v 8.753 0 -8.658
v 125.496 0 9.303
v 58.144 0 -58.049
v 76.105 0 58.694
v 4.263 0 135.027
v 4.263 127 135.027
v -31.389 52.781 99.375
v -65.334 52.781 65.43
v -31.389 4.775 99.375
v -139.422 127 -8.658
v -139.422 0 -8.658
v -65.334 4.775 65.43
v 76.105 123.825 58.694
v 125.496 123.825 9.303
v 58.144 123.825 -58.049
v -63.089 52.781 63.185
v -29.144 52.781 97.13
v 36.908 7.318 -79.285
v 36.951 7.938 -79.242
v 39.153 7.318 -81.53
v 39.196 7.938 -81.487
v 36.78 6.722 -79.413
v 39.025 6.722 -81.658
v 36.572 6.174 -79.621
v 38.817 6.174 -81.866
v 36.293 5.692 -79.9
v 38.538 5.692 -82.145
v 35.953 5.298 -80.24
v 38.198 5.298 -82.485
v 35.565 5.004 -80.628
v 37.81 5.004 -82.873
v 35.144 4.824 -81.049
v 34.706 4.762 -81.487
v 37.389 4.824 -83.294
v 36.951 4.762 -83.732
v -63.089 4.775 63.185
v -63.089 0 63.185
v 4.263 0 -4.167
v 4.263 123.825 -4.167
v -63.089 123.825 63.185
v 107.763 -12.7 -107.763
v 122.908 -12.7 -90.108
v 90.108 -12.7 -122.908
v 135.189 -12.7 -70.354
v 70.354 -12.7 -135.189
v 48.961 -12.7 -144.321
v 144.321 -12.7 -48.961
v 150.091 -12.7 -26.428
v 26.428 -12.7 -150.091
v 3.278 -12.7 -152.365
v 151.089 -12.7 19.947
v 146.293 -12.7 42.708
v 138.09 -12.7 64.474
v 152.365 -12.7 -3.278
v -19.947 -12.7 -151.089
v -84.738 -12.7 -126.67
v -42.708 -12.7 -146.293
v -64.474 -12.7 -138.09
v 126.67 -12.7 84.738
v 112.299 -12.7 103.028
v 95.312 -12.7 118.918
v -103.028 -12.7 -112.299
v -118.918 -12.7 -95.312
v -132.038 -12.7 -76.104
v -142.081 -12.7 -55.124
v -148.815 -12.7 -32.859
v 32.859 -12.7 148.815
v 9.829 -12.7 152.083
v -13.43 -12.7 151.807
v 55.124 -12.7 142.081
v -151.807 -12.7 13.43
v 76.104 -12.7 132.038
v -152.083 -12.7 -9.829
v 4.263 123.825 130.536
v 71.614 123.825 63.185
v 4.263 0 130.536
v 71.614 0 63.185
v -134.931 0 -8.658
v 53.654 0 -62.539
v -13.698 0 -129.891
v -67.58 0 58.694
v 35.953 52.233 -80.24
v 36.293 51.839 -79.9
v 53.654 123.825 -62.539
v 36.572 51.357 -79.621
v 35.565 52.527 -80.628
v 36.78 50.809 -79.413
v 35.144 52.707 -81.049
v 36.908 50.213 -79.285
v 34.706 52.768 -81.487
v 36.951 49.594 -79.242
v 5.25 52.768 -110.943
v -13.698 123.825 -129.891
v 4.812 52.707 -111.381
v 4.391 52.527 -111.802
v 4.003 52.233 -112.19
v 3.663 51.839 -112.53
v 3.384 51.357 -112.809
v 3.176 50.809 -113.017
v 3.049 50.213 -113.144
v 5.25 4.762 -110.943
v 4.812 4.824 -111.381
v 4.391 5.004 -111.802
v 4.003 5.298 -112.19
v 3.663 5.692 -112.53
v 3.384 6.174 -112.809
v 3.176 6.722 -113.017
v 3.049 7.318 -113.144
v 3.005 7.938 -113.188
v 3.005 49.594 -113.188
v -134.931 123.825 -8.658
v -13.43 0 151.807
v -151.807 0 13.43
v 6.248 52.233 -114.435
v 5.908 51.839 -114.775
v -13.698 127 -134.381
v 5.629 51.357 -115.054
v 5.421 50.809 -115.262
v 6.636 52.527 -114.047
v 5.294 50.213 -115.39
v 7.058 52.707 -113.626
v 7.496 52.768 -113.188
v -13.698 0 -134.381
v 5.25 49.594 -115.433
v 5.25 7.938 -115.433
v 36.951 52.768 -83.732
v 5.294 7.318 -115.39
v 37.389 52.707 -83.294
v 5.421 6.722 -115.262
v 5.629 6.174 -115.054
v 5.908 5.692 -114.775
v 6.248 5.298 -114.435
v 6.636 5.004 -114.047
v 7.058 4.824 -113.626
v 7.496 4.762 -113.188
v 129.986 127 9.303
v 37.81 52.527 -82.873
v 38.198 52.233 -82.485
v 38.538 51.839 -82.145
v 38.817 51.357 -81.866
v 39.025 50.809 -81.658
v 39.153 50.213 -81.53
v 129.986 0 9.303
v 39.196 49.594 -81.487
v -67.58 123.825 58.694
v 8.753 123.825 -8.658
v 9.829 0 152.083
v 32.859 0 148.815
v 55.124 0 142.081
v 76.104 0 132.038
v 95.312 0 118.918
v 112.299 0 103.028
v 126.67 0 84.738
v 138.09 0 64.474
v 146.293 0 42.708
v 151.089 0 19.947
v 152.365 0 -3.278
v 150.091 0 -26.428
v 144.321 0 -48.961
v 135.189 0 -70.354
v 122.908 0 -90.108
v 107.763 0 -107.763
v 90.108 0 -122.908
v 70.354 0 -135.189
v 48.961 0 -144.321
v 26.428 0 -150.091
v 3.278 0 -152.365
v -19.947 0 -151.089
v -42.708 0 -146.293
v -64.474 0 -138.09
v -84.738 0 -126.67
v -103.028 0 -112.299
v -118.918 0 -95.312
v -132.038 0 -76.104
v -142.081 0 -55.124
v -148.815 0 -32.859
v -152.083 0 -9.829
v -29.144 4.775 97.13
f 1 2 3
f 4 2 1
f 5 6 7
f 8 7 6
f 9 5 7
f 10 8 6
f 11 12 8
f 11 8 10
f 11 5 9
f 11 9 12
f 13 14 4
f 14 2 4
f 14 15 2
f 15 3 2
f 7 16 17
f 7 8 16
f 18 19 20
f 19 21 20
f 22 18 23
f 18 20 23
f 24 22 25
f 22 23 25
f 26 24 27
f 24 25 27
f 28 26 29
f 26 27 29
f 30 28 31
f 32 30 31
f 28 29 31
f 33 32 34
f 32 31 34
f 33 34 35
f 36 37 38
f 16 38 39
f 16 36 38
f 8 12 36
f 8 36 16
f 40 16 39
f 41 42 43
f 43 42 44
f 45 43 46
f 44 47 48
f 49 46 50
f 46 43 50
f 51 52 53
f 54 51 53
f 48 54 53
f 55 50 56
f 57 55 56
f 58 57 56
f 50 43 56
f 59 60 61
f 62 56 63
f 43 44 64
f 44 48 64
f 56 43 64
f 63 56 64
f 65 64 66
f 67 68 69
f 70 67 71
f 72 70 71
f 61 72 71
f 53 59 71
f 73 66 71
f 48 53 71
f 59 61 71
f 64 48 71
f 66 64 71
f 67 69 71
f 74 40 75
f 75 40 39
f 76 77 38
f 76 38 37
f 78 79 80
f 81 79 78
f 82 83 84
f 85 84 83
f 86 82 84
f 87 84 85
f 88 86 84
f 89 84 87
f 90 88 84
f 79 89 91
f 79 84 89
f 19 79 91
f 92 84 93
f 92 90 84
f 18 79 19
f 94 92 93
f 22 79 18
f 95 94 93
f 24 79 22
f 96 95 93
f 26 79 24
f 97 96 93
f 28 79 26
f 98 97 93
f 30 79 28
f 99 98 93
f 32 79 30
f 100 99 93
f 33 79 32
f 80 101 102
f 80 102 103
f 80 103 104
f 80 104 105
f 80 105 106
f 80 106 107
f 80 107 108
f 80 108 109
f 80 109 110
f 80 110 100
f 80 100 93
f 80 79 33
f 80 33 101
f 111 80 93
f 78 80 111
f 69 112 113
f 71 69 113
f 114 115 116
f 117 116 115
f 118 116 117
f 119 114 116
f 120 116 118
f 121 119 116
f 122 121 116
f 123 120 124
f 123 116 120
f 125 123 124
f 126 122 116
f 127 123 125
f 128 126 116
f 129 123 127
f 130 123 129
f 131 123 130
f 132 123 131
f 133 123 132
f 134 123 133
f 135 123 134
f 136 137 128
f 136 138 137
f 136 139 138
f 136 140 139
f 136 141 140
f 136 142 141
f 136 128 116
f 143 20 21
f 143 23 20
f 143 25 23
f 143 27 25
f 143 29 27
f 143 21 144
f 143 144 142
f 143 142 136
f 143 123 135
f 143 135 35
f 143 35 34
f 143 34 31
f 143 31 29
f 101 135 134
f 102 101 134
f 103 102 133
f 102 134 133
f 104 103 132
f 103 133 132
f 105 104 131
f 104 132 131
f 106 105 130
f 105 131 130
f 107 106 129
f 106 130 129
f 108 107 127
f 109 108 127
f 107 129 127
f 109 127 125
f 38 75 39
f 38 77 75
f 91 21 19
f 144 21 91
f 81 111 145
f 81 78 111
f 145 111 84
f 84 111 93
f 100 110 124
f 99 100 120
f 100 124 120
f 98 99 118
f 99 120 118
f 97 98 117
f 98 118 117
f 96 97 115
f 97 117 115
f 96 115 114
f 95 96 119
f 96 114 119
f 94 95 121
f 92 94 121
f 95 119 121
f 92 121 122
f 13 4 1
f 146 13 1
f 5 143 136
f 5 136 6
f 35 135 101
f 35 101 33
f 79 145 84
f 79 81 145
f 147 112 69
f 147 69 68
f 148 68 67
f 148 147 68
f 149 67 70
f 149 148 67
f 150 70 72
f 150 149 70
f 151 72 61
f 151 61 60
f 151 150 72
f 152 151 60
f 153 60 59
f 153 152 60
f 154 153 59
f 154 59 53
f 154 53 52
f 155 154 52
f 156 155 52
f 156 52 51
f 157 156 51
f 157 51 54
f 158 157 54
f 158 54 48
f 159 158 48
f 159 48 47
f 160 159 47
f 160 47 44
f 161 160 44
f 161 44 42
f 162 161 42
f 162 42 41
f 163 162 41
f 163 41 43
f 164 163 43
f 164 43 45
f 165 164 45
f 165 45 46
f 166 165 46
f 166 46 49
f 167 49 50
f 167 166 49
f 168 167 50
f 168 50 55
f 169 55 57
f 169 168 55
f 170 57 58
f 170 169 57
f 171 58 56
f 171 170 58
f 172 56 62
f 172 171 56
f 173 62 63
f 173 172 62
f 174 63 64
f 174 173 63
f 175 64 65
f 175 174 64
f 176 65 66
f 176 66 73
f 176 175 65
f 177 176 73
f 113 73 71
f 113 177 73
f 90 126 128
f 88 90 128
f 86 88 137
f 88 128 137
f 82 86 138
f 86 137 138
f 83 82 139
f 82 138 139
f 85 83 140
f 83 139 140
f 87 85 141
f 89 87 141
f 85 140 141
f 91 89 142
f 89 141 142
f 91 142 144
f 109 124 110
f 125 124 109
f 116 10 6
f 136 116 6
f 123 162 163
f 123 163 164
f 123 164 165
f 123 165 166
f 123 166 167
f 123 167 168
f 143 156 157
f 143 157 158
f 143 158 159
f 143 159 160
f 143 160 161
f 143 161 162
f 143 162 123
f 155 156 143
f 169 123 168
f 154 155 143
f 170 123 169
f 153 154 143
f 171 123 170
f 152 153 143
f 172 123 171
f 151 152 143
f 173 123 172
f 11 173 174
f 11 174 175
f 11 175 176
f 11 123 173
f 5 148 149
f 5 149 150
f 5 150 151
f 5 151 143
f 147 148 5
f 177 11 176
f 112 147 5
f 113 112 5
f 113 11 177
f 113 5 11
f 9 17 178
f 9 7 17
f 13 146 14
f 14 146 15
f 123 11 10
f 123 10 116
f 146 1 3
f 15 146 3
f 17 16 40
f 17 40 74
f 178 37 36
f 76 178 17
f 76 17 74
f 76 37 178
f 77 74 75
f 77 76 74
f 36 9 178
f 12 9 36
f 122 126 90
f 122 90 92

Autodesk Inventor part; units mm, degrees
ref_plane "YZ Plane" through (0, 0, 0) normal (1, 0, 0) x (0, 1, 0)
ref_plane "XZ Plane" through (0, 0, 0) normal (0, 1, 0) x (-1, 0, 0)
ref_plane "XY Plane" through (0, 0, 0) normal (0, 0, 1) x (1, 0, 0)
sketch "Sketch1" plane through (0, 0, 0) normal (0, 1, 0) x (-1, 0, 0)
  arc A0 (13.4296, 151.8071) -> (151.8071, 13.4296) centre (0, 0) ccw
  line L0 (13.4296, 151.8071) -> (151.8071, 13.4296)
  dimension "d0" = 304.8
sketch "Sketch2" plane through (0, 0, 0) normal (0, 1, 0) x (-1, 0, 0)
  line L0 (-4.2626, 135.0266) -> (-129.9862, 9.3031)
  line L1 (-129.9862, 9.3031) -> (13.6979, -134.381)
  line L2 (13.6979, -134.381) -> (139.4215, -8.6575)
  line L3 (139.4215, -8.6575) -> (-4.2626, 135.0266)
  line L4 (-4.2626, 135.0266) -> (-76.1046, 63.1846)
  line L5 (-76.1046, 63.1846) -> (-4.2626, -8.6575)
  line L6 (-4.2626, -8.6575) -> (67.5795, 63.1846)
  line L7 (67.5795, 63.1846) -> (-4.2626, 135.0266)
  line L8 (-129.9862, 9.3031) -> (-76.1046, 63.1846)
  line L9 (-76.1046, 63.1846) -> (-4.2626, -8.6575)
  line L10 (-4.2626, -8.6575) -> (-58.1441, -62.539)
  line L11 (-58.1441, -62.539) -> (-129.9862, 9.3031)
  line L12 (-4.2626, 130.5365) -> (-71.6145, 63.1846)
  line L13 (-71.6145, 63.1846) -> (-4.2626, -4.1673)
  line L14 (-4.2626, -4.1673) -> (63.0893, 63.1846)
  line L15 (63.0893, 63.1846) -> (-4.2626, 130.5365)
  line L16 (-125.496, 9.3031) -> (-76.1046, 58.6945)
  line L17 (-76.1046, 58.6945) -> (-8.7527, -8.6575)
  line L18 (-8.7527, -8.6575) -> (-58.1441, -58.0489)
  line L19 (-58.1441, -58.0489) -> (-125.496, 9.3031)
  line L20 (67.5795, 58.6945) -> (-53.654, -62.539)
  line L21 (-53.654, -62.539) -> (13.6979, -129.8909)
  line L22 (13.6979, -129.8909) -> (134.9314, -8.6575)
  line L23 (134.9314, -8.6575) -> (67.5795, 58.6945)
  point P0 (0, 0)
  point P1 (4.7177, 0.3228)
  dimension "d42" = 203.2
  dimension "d43" = 177.8
  dimension "d44" = 3.175
  dimension "d45" = 6.35
  dimension "d46" = 95.25
  dimension "d47" = 171.45
  dimension "d48" = 95.25
  dimension "d49" = 69.85
  dimension "d50" = 95.25
extrude "Extrusion1" add sketch "Sketch1" against normal blind 12.7
extrude "Extrusion2" add sketch "Sketch2" along normal blind 127
sketch "Sketch3" plane through (-13.6979, 0, -134.381) normal (0.7071068, 0, -0.7071068) x (-0.7071068, 0, -0.7071068)
  line L0 (-29.972, 4.7625) -> (-71.628, 4.7625)
  line L1 (-74.803, 7.9375) -> (-74.803, 49.5935)
  line L2 (-71.628, 52.7685) -> (-29.972, 52.7685)
  line L3 (-26.797, 49.5935) -> (-26.797, 7.9375)
  line L4 (-257.1076, 0) -> (47.6924, 0) projected
  line L5 (0, 0) -> (0, 127) projected
  arc A0 (-26.797, 49.5935) -> (-29.972, 52.7685) centre (-29.972, 49.5935) ccw
  arc A1 (-29.972, 4.7625) -> (-26.797, 7.9375) centre (-29.972, 7.9375) ccw
  arc A2 (-74.803, 7.9375) -> (-71.628, 4.7625) centre (-71.628, 7.9375) ccw
  arc A3 (-71.628, 52.7685) -> (-74.803, 49.5935) centre (-71.628, 49.5935) ccw
  point P0 (-104.7076, 0)
  point P1 (-74.803, 52.7685)
  point P2 (-74.803, 4.7625)
  point P3 (-26.797, 52.7685)
  point P4 (-6.8599, 0)
  point P5 (-202.5554, 0)
  dimension "d25" = 4.7625
  dimension "d26" = 48.006
  dimension "d27" = 26.797
  dimension "d28" = 48.006
  dimension "d29" = 3.175
sketch "Sketch4" plane through (4.2626, 0, 135.0266) normal (-0.7071068, 0, 0.7071068) x (0.7071068, 0, 0.7071068)
  line L0 (-98.425, 52.7812) -> (-50.419, 52.7812)
  line L1 (-50.419, 52.7812) -> (-50.419, 4.7752)
  line L2 (-50.419, 4.7752) -> (-98.425, 4.7752)
  line L3 (-98.425, 4.7752) -> (-98.425, 52.7812)
  line L4 (-0.6446, 0) -> (-196.3401, 0) projected
  line L5 (0, 0) -> (0, 127) projected
  point P0 (-98.4924, 0)
  dimension "d30" = 48.006
  dimension "d31" = 48.006
  dimension "d32" = 4.7752
  dimension "d33" = 50.419
extrude "Extrusion3" cut sketch "Sketch4" against normal up to next
extrude "Extrusion4" cut sketch "Sketch3" against normal up to next
sketch "Sketch5" plane through (0, 127, 0) normal (0, 1, 0) x (1, 0, 0)
  line L0 (-139.4215, 8.6575) -> (-13.6979, 134.381) projected
  line L1 (4.2626, -135.0266) -> (-139.4215, 8.6575)
  line L2 (-139.4215, 8.6575) -> (-13.6979, 134.381)
  line L3 (-13.6979, 134.381) -> (129.9862, -9.3031) projected
  line L4 (-13.6979, 134.381) -> (129.9862, -9.3031)
  line L5 (129.9862, -9.3031) -> (4.2626, -135.0266)
  point P0 (0, 0)
extrude "Extrusion5" cut sketch "Sketch5" against normal blind 3.175
sketch "Sketch6" plane through (0, 123.825, 0) normal (0, 1, 0) x (1, 0, 0)
  line L0 (4.2626, -135.0266) -> (-139.4215, 8.6575) projected
  line L1 (4.2626, -135.0266) -> (-139.4215, 8.6575)
  line L2 (-139.4215, 8.6575) -> (-13.6979, 134.381)
  line L3 (-13.6979, 134.381) -> (129.9862, -9.3031) projected
  line L4 (-13.6979, 134.381) -> (129.9862, -9.3031)
  line L5 (129.9862, -9.3031) -> (4.2626, -135.0266)
  line L6 (4.2626, -130.5365) -> (71.6145, -63.1846) projected
  point P0 (0, 0)
extrude "Extrusion6" add sketch "Sketch6" along normal blind 3.175
sketch "Sketch7" plane through (0, 127, 0) normal (0, 1, 0) x (1, 0, 0)
  point P0 (0, 0)
properties part number "Hermes plate" material "Aluminum 6061"
